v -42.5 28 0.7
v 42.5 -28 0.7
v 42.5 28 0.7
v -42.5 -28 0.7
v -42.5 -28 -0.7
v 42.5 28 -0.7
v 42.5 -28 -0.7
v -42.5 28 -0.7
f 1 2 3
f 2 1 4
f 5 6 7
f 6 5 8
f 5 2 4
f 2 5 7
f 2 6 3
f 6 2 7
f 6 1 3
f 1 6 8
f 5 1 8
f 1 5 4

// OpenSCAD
$fn=64;

module single_board_computer(length=85.0, width=56.0, thickness=1.4) {
    cube([length, width, thickness], center=true);
}

single_board_computer();
